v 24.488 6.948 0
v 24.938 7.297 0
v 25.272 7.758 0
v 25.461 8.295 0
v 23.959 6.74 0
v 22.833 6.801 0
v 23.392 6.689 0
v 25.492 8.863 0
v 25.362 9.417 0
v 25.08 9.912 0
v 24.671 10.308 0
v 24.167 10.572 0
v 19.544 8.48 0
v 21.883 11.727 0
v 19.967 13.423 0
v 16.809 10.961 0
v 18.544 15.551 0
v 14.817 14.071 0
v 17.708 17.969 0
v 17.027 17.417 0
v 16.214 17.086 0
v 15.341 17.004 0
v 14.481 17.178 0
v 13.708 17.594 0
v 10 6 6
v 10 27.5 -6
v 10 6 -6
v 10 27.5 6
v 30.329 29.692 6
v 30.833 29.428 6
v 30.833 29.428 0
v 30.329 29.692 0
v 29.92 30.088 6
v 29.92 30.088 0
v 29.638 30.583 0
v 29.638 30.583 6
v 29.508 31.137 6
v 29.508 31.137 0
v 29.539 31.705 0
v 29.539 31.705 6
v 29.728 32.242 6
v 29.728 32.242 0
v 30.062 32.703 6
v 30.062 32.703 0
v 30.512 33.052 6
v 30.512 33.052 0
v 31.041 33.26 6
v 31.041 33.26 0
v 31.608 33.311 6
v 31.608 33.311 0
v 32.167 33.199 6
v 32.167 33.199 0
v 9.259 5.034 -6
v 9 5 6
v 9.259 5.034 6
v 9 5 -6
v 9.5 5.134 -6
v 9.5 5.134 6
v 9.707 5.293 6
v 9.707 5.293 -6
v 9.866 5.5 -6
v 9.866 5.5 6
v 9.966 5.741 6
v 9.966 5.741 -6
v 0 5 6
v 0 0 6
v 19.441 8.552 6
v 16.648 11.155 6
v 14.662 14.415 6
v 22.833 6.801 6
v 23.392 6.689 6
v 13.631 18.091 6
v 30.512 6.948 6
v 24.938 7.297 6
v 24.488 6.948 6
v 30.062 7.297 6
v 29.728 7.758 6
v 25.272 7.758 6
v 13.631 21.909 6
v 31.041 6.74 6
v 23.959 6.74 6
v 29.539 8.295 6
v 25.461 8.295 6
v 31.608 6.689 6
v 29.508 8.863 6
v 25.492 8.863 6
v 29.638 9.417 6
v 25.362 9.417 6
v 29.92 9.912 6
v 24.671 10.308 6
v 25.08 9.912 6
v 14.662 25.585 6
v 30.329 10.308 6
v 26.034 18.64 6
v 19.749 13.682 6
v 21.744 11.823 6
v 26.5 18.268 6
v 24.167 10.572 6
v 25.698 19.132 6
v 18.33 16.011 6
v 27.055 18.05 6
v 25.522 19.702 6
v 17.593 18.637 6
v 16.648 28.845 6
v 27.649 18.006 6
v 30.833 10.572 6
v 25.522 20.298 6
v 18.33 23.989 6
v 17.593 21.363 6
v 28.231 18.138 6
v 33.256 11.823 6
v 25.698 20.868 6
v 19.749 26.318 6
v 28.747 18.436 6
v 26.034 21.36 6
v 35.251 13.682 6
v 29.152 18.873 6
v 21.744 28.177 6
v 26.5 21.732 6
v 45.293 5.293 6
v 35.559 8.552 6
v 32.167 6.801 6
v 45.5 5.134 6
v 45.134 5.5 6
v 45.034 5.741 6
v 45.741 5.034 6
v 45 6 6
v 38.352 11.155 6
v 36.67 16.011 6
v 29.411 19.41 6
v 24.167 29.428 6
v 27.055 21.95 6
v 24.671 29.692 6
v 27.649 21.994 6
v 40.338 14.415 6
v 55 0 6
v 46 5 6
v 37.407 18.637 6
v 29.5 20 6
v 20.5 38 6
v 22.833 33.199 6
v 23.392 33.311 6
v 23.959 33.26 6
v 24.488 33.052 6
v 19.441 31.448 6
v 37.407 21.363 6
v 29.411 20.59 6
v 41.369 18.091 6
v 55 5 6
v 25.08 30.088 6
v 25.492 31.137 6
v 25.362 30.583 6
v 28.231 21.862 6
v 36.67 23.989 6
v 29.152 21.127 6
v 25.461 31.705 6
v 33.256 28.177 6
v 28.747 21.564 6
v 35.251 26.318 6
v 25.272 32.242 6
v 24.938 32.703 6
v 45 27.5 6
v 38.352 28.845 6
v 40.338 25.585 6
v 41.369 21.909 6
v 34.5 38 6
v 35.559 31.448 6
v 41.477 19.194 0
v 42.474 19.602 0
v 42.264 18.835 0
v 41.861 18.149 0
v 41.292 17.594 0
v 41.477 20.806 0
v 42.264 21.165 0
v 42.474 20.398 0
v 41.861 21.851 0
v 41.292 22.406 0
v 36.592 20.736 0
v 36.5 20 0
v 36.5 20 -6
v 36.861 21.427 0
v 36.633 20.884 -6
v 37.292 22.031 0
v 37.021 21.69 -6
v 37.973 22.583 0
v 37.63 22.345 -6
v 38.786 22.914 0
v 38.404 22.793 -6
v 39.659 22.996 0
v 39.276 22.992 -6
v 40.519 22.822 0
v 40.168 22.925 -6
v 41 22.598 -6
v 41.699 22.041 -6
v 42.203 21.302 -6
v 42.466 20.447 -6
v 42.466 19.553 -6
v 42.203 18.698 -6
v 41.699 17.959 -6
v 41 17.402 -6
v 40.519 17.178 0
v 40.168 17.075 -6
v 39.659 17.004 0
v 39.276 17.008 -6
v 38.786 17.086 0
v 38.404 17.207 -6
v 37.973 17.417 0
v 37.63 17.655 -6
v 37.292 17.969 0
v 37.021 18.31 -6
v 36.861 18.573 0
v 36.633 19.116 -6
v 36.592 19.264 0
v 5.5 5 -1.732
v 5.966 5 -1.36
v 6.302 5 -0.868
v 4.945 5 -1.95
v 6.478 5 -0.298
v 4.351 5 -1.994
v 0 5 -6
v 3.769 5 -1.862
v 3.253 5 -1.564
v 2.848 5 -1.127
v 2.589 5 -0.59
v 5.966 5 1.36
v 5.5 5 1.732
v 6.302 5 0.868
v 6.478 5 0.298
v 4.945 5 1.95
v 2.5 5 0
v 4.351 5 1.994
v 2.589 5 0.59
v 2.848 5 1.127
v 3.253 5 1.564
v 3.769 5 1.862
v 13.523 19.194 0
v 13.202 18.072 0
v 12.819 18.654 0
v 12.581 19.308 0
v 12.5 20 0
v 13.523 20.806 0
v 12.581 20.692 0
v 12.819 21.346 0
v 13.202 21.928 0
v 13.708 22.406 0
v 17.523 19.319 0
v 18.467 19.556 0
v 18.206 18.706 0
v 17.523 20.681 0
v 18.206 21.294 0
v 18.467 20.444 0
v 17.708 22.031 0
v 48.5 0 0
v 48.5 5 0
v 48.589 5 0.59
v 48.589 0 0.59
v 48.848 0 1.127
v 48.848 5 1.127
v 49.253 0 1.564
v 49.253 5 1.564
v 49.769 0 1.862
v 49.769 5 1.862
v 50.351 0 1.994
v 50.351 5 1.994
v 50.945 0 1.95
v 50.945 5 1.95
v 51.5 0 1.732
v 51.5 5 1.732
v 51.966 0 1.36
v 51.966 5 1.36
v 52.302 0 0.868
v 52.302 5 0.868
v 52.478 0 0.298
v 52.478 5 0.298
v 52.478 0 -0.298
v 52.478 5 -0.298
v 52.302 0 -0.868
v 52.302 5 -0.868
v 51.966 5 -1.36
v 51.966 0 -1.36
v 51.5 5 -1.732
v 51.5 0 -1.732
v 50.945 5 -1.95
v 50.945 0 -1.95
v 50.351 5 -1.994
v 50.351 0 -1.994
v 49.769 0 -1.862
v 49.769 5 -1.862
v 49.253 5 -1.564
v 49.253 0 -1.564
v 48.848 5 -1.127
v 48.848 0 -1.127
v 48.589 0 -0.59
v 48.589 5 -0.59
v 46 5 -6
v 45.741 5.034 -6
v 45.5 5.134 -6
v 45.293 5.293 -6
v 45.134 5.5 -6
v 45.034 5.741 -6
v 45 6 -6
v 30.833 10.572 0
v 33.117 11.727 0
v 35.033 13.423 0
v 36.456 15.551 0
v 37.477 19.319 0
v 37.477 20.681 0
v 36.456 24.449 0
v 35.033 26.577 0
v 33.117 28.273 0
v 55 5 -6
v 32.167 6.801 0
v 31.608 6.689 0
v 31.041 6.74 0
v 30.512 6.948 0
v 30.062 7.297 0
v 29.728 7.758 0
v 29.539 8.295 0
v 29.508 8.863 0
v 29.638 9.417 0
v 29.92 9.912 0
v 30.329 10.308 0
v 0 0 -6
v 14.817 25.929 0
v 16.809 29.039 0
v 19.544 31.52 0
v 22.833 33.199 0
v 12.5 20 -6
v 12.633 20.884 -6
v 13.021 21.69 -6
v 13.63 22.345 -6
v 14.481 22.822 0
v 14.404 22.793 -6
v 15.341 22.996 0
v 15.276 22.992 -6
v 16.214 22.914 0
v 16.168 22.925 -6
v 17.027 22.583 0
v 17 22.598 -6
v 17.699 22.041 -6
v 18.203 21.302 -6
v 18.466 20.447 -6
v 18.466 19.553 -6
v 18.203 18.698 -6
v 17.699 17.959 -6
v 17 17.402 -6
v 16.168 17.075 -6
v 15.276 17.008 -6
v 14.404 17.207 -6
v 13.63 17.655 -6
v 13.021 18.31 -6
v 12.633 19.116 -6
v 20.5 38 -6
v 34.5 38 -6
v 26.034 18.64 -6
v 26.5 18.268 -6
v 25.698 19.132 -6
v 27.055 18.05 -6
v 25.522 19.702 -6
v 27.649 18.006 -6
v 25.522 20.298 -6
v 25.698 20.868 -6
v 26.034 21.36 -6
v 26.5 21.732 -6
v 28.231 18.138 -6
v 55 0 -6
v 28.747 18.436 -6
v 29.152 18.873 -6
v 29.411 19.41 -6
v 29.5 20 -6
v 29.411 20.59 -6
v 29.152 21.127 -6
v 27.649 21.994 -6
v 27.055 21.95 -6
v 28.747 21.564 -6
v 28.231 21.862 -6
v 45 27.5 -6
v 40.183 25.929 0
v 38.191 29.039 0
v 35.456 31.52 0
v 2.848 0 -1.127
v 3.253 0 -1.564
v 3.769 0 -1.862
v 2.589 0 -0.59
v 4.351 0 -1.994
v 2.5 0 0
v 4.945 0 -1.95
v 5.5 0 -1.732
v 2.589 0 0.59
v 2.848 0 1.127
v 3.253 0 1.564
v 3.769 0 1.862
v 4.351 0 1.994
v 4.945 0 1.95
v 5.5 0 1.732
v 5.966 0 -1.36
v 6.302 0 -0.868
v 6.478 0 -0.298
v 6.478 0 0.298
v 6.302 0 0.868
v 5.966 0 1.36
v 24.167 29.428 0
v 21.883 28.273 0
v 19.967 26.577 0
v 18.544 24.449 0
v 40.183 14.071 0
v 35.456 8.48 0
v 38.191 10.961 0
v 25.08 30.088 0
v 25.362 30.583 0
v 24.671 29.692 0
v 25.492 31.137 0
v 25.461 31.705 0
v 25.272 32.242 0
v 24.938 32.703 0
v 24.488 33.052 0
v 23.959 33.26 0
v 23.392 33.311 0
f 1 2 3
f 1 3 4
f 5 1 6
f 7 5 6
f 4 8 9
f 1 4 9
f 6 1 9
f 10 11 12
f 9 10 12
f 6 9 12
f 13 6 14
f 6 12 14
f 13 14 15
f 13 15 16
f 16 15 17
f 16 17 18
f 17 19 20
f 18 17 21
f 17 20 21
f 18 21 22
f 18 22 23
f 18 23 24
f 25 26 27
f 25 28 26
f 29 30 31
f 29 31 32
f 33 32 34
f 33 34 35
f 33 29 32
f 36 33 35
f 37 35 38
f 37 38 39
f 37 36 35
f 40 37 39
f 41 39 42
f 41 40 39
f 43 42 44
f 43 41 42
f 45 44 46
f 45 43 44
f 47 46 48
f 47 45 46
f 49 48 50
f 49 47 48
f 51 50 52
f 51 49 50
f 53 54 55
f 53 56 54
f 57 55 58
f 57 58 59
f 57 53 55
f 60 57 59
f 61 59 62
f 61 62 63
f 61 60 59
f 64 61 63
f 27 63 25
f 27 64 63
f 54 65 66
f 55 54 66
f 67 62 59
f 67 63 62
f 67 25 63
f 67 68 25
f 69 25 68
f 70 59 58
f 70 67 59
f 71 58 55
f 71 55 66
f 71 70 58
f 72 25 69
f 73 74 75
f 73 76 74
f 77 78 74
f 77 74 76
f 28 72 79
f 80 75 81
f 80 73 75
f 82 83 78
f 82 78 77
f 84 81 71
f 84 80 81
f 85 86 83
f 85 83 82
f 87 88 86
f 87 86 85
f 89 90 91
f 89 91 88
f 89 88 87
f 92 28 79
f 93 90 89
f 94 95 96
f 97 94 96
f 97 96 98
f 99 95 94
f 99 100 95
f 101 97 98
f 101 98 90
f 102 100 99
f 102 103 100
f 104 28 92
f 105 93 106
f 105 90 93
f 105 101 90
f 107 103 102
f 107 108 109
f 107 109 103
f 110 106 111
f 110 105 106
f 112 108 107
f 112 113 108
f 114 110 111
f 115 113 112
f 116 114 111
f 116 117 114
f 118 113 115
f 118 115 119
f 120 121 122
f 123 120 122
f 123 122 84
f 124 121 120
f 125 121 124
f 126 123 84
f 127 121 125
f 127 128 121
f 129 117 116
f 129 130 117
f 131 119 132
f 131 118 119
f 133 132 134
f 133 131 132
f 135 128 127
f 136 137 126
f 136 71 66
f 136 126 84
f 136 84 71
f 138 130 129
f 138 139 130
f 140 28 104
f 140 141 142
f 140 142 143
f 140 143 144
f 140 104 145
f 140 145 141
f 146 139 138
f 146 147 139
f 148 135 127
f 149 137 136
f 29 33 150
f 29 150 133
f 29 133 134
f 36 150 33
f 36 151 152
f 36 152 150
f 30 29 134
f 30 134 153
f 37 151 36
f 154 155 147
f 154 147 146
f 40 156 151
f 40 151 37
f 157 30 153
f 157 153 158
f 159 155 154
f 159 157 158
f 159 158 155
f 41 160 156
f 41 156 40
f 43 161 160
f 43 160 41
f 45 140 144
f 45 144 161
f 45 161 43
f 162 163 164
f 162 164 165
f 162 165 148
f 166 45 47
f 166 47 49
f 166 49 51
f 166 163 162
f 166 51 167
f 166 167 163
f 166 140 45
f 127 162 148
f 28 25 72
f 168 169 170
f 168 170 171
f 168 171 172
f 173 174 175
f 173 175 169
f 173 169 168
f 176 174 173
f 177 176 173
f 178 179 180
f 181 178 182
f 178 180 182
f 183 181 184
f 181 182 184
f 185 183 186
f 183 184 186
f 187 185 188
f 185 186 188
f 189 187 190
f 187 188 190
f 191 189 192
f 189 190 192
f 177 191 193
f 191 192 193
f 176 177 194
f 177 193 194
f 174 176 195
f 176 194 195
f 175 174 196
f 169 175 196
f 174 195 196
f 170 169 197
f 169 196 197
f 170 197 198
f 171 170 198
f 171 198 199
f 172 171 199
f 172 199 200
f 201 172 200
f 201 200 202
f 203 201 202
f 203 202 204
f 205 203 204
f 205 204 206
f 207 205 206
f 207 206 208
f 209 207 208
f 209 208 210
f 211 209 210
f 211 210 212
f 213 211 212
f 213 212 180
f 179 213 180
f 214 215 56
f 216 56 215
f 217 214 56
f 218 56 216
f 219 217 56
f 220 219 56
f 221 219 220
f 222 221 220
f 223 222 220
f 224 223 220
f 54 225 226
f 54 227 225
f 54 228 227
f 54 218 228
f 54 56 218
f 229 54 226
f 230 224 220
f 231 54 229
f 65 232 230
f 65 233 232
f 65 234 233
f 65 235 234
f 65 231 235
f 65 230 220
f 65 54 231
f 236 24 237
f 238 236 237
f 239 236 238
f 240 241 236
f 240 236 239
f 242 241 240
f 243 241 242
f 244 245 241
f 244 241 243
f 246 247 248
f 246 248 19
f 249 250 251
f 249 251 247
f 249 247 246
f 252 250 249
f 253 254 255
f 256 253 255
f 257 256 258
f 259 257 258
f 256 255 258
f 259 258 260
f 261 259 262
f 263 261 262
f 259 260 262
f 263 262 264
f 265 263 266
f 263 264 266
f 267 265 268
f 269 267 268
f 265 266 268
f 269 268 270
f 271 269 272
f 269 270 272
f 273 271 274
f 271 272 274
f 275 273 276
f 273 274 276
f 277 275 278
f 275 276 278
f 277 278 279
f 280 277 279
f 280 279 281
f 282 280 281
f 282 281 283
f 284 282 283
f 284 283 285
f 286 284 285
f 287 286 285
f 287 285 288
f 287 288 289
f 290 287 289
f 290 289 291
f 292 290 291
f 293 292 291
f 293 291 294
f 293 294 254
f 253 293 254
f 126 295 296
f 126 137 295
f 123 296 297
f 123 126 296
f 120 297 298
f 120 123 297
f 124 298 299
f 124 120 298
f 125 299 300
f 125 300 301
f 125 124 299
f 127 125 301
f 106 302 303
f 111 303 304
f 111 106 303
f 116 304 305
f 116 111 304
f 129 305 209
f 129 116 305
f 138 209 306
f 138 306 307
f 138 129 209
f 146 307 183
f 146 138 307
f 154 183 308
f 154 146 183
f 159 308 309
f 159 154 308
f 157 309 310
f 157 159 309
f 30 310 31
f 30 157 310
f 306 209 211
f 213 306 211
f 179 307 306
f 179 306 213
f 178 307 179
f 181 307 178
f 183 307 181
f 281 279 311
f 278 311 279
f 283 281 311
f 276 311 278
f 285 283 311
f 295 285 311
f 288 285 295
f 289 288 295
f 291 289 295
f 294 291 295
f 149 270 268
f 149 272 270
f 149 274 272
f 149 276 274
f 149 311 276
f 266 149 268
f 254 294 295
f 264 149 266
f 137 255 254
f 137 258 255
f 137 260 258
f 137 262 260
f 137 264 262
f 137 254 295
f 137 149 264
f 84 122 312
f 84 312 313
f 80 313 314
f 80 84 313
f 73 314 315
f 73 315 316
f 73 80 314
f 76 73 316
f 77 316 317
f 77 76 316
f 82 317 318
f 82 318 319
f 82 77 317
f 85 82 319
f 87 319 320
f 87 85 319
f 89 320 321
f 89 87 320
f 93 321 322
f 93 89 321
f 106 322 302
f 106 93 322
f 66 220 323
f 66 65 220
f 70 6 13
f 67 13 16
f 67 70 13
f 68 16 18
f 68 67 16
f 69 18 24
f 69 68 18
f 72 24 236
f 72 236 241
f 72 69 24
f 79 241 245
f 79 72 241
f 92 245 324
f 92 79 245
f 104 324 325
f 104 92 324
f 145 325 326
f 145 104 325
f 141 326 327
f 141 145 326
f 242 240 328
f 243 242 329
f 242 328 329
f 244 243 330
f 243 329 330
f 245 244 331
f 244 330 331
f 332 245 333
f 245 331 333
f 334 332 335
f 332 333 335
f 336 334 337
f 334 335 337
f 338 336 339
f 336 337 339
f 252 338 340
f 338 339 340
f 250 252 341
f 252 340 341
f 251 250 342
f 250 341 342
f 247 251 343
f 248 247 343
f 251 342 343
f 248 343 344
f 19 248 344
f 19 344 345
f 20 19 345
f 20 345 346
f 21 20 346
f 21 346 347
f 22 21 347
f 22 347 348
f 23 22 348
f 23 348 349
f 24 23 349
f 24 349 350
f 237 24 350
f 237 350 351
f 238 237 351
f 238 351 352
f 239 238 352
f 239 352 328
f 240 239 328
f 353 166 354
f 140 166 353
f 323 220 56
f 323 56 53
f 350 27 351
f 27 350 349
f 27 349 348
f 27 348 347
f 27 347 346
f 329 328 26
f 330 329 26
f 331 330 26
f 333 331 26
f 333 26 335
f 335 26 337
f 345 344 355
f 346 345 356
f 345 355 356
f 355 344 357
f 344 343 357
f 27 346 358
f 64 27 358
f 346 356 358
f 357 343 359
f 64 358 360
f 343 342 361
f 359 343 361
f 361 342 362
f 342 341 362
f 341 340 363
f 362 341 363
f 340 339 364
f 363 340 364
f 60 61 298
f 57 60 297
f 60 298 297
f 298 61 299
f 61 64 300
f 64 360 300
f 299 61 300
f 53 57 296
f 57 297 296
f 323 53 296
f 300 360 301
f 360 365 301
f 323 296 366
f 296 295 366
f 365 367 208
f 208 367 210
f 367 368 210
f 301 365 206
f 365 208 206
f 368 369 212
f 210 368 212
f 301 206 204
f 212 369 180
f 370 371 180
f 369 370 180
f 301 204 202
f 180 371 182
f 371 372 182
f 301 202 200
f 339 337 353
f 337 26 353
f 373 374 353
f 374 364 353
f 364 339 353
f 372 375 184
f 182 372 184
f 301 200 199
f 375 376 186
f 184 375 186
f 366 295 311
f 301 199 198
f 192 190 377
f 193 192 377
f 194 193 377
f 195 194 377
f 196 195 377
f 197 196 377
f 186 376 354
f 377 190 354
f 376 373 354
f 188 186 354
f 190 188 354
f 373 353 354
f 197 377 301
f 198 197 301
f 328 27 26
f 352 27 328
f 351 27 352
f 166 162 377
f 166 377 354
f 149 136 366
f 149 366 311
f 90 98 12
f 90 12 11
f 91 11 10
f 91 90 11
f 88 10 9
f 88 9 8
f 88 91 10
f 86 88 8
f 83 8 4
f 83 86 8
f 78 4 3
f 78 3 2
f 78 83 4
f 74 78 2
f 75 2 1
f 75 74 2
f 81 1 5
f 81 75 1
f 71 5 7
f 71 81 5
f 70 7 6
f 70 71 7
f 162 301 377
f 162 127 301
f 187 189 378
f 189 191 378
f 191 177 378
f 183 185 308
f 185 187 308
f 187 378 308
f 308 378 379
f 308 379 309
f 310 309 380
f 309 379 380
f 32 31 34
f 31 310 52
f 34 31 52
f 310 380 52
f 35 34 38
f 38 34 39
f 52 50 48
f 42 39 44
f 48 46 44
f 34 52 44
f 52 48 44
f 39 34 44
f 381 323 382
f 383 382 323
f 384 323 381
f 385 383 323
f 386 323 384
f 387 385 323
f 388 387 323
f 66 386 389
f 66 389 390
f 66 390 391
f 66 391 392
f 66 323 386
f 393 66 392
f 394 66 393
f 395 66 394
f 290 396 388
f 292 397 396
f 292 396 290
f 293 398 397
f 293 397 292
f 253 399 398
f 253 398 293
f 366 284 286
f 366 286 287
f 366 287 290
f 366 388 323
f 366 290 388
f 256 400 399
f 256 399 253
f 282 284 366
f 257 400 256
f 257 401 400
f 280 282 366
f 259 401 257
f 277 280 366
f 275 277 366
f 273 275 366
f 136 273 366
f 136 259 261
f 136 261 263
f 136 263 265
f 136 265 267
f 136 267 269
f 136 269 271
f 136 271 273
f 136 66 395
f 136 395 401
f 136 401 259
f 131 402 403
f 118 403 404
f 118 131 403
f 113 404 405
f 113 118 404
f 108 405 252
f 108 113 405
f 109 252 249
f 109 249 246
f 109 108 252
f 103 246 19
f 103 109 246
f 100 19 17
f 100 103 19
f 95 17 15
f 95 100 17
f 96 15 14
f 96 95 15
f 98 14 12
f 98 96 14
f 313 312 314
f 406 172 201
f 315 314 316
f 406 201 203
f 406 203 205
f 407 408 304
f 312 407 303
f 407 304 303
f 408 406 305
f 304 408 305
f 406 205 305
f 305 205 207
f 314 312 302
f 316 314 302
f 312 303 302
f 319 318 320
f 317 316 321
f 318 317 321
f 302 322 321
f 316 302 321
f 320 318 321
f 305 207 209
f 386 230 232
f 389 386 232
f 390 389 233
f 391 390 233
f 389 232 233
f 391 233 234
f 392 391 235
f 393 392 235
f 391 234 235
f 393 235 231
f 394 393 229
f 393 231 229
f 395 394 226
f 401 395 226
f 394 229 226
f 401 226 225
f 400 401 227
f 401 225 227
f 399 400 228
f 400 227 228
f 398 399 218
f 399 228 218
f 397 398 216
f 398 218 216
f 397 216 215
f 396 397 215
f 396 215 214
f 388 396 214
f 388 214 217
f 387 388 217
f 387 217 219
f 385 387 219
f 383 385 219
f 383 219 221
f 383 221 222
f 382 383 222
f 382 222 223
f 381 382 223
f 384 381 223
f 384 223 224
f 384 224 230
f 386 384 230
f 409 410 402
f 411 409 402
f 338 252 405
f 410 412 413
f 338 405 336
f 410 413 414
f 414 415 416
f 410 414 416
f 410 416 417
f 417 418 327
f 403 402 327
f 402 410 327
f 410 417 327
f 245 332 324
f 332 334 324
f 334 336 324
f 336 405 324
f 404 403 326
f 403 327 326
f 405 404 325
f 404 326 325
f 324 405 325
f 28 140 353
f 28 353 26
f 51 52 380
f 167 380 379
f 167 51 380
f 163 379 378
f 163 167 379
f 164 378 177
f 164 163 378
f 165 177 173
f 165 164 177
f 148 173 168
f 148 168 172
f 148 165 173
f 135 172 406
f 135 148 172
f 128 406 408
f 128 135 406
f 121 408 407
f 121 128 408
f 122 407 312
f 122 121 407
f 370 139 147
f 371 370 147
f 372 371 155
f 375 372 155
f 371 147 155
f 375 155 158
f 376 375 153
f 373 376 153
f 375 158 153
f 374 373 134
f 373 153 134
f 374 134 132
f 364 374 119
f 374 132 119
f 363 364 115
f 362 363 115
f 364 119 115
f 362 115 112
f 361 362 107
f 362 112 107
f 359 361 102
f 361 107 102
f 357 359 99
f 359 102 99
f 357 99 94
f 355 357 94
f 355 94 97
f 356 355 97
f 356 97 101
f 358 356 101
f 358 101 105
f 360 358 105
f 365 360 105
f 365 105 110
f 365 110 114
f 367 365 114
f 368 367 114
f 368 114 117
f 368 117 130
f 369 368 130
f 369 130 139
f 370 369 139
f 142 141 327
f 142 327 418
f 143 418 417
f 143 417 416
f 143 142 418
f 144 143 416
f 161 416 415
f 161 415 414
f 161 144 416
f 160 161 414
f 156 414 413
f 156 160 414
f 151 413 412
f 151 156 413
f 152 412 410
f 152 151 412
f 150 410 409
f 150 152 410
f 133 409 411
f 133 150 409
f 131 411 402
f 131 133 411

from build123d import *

# Parameters (mm, degrees)
BOSS_EXTRUDE1_DEPTH = 6
SKETCH2_R           = 2
CUT_EXTRUDE1_DEPTH  = 68.919069487
CUT_EXTRUDE2_DEPTH  = 6
SKETCH4_R           = 3
CUT_EXTRUDE3_DEPTH  = 6
SKETCH5_R           = 2
CUT_EXTRUDE4_DEPTH  = 65.420493634
FILLET1_R           = 1


with BuildPart() as part:
    # Sketch1 → Boss-Extrude1 (new, symmetric)
    with BuildSketch(Plane.XY):
        Polygon((0, 0), (55, 0), (55, 5), (45, 5), (45, 27.5), (34.5, 38), (20.5, 38), (10, 27.5), (10, 5), (0, 5), align=None)
    extrude(amount=BOSS_EXTRUDE1_DEPTH, both=True)

    # Sketch2 → Cut-Extrude1 (cut, through all)
    with BuildSketch(Plane.XY.offset(6)):
        with Locations((27.5, 20)):
            Circle(SKETCH2_R)
    extrude(amount=-CUT_EXTRUDE1_DEPTH, mode=Mode.SUBTRACT)

    # Sketch3 → Cut-Extrude2 (cut)
    with BuildSketch(Plane.XY.offset(6)):
        with BuildLine():
            ThreePointArc((24.166666667, 29.428090416), (17.5, 20), (24.166666667, 10.571909584))
            ThreePointArc((24.166666667, 10.571909584), (25.385618083, 8.019624834), (22.833333333, 6.800673418))
            ThreePointArc((22.833333333, 6.800673418), (13.5, 20), (22.833333333, 33.199326582))
            ThreePointArc((22.833333333, 33.199326582), (25.385618083, 31.980375166), (24.166666667, 29.428090416))
        make_face()
        with BuildLine():
            ThreePointArc((32.166666667, 6.800673418), (29.614381917, 8.019624834), (30.833333333, 10.571909584))
            ThreePointArc((30.833333333, 10.571909584), (37.5, 20), (30.833333333, 29.428090416))
            ThreePointArc((30.833333333, 29.428090416), (29.614381917, 31.980375166), (32.166666667, 33.199326582))
            ThreePointArc((32.166666667, 33.199326582), (41.5, 20), (32.166666667, 6.800673418))
        make_face()
    extrude(amount=-CUT_EXTRUDE2_DEPTH, mode=Mode.SUBTRACT)

    # Sketch4 → Cut-Extrude3 (cut)
    with BuildSketch(Plane(origin=(0, 0, -6), x_dir=(-1, 0, 0), z_dir=(0, 0, -1))):
        with Locations((-39.5, 20)):
            Circle(SKETCH4_R)
        with Locations((-15.5, 20)):
            Circle(SKETCH4_R)
    extrude(amount=-CUT_EXTRUDE3_DEPTH, mode=Mode.SUBTRACT)

    # Sketch5 → Cut-Extrude4 (cut, through all)
    with BuildSketch(Plane(origin=(0, 5, 0), x_dir=(1, 0, 0), z_dir=(0, 1, 0))):
        with Locations(Location((4.5, 0, 0), (0, 0, 180))):
            Circle(SKETCH5_R)
        with Locations(Location((50.5, 0, 0), (0, 0, 180))):
            Circle(SKETCH5_R)
    extrude(amount=-CUT_EXTRUDE4_DEPTH, mode=Mode.SUBTRACT)

    # Fillet1
    fillet1_edges = [part.edges().sort_by_distance(p)[0] for p in [
        (10, 5, 0),
        (45, 5, 0),
    ]]
    fillet(fillet1_edges, radius=FILLET1_R)


solid = part.part
